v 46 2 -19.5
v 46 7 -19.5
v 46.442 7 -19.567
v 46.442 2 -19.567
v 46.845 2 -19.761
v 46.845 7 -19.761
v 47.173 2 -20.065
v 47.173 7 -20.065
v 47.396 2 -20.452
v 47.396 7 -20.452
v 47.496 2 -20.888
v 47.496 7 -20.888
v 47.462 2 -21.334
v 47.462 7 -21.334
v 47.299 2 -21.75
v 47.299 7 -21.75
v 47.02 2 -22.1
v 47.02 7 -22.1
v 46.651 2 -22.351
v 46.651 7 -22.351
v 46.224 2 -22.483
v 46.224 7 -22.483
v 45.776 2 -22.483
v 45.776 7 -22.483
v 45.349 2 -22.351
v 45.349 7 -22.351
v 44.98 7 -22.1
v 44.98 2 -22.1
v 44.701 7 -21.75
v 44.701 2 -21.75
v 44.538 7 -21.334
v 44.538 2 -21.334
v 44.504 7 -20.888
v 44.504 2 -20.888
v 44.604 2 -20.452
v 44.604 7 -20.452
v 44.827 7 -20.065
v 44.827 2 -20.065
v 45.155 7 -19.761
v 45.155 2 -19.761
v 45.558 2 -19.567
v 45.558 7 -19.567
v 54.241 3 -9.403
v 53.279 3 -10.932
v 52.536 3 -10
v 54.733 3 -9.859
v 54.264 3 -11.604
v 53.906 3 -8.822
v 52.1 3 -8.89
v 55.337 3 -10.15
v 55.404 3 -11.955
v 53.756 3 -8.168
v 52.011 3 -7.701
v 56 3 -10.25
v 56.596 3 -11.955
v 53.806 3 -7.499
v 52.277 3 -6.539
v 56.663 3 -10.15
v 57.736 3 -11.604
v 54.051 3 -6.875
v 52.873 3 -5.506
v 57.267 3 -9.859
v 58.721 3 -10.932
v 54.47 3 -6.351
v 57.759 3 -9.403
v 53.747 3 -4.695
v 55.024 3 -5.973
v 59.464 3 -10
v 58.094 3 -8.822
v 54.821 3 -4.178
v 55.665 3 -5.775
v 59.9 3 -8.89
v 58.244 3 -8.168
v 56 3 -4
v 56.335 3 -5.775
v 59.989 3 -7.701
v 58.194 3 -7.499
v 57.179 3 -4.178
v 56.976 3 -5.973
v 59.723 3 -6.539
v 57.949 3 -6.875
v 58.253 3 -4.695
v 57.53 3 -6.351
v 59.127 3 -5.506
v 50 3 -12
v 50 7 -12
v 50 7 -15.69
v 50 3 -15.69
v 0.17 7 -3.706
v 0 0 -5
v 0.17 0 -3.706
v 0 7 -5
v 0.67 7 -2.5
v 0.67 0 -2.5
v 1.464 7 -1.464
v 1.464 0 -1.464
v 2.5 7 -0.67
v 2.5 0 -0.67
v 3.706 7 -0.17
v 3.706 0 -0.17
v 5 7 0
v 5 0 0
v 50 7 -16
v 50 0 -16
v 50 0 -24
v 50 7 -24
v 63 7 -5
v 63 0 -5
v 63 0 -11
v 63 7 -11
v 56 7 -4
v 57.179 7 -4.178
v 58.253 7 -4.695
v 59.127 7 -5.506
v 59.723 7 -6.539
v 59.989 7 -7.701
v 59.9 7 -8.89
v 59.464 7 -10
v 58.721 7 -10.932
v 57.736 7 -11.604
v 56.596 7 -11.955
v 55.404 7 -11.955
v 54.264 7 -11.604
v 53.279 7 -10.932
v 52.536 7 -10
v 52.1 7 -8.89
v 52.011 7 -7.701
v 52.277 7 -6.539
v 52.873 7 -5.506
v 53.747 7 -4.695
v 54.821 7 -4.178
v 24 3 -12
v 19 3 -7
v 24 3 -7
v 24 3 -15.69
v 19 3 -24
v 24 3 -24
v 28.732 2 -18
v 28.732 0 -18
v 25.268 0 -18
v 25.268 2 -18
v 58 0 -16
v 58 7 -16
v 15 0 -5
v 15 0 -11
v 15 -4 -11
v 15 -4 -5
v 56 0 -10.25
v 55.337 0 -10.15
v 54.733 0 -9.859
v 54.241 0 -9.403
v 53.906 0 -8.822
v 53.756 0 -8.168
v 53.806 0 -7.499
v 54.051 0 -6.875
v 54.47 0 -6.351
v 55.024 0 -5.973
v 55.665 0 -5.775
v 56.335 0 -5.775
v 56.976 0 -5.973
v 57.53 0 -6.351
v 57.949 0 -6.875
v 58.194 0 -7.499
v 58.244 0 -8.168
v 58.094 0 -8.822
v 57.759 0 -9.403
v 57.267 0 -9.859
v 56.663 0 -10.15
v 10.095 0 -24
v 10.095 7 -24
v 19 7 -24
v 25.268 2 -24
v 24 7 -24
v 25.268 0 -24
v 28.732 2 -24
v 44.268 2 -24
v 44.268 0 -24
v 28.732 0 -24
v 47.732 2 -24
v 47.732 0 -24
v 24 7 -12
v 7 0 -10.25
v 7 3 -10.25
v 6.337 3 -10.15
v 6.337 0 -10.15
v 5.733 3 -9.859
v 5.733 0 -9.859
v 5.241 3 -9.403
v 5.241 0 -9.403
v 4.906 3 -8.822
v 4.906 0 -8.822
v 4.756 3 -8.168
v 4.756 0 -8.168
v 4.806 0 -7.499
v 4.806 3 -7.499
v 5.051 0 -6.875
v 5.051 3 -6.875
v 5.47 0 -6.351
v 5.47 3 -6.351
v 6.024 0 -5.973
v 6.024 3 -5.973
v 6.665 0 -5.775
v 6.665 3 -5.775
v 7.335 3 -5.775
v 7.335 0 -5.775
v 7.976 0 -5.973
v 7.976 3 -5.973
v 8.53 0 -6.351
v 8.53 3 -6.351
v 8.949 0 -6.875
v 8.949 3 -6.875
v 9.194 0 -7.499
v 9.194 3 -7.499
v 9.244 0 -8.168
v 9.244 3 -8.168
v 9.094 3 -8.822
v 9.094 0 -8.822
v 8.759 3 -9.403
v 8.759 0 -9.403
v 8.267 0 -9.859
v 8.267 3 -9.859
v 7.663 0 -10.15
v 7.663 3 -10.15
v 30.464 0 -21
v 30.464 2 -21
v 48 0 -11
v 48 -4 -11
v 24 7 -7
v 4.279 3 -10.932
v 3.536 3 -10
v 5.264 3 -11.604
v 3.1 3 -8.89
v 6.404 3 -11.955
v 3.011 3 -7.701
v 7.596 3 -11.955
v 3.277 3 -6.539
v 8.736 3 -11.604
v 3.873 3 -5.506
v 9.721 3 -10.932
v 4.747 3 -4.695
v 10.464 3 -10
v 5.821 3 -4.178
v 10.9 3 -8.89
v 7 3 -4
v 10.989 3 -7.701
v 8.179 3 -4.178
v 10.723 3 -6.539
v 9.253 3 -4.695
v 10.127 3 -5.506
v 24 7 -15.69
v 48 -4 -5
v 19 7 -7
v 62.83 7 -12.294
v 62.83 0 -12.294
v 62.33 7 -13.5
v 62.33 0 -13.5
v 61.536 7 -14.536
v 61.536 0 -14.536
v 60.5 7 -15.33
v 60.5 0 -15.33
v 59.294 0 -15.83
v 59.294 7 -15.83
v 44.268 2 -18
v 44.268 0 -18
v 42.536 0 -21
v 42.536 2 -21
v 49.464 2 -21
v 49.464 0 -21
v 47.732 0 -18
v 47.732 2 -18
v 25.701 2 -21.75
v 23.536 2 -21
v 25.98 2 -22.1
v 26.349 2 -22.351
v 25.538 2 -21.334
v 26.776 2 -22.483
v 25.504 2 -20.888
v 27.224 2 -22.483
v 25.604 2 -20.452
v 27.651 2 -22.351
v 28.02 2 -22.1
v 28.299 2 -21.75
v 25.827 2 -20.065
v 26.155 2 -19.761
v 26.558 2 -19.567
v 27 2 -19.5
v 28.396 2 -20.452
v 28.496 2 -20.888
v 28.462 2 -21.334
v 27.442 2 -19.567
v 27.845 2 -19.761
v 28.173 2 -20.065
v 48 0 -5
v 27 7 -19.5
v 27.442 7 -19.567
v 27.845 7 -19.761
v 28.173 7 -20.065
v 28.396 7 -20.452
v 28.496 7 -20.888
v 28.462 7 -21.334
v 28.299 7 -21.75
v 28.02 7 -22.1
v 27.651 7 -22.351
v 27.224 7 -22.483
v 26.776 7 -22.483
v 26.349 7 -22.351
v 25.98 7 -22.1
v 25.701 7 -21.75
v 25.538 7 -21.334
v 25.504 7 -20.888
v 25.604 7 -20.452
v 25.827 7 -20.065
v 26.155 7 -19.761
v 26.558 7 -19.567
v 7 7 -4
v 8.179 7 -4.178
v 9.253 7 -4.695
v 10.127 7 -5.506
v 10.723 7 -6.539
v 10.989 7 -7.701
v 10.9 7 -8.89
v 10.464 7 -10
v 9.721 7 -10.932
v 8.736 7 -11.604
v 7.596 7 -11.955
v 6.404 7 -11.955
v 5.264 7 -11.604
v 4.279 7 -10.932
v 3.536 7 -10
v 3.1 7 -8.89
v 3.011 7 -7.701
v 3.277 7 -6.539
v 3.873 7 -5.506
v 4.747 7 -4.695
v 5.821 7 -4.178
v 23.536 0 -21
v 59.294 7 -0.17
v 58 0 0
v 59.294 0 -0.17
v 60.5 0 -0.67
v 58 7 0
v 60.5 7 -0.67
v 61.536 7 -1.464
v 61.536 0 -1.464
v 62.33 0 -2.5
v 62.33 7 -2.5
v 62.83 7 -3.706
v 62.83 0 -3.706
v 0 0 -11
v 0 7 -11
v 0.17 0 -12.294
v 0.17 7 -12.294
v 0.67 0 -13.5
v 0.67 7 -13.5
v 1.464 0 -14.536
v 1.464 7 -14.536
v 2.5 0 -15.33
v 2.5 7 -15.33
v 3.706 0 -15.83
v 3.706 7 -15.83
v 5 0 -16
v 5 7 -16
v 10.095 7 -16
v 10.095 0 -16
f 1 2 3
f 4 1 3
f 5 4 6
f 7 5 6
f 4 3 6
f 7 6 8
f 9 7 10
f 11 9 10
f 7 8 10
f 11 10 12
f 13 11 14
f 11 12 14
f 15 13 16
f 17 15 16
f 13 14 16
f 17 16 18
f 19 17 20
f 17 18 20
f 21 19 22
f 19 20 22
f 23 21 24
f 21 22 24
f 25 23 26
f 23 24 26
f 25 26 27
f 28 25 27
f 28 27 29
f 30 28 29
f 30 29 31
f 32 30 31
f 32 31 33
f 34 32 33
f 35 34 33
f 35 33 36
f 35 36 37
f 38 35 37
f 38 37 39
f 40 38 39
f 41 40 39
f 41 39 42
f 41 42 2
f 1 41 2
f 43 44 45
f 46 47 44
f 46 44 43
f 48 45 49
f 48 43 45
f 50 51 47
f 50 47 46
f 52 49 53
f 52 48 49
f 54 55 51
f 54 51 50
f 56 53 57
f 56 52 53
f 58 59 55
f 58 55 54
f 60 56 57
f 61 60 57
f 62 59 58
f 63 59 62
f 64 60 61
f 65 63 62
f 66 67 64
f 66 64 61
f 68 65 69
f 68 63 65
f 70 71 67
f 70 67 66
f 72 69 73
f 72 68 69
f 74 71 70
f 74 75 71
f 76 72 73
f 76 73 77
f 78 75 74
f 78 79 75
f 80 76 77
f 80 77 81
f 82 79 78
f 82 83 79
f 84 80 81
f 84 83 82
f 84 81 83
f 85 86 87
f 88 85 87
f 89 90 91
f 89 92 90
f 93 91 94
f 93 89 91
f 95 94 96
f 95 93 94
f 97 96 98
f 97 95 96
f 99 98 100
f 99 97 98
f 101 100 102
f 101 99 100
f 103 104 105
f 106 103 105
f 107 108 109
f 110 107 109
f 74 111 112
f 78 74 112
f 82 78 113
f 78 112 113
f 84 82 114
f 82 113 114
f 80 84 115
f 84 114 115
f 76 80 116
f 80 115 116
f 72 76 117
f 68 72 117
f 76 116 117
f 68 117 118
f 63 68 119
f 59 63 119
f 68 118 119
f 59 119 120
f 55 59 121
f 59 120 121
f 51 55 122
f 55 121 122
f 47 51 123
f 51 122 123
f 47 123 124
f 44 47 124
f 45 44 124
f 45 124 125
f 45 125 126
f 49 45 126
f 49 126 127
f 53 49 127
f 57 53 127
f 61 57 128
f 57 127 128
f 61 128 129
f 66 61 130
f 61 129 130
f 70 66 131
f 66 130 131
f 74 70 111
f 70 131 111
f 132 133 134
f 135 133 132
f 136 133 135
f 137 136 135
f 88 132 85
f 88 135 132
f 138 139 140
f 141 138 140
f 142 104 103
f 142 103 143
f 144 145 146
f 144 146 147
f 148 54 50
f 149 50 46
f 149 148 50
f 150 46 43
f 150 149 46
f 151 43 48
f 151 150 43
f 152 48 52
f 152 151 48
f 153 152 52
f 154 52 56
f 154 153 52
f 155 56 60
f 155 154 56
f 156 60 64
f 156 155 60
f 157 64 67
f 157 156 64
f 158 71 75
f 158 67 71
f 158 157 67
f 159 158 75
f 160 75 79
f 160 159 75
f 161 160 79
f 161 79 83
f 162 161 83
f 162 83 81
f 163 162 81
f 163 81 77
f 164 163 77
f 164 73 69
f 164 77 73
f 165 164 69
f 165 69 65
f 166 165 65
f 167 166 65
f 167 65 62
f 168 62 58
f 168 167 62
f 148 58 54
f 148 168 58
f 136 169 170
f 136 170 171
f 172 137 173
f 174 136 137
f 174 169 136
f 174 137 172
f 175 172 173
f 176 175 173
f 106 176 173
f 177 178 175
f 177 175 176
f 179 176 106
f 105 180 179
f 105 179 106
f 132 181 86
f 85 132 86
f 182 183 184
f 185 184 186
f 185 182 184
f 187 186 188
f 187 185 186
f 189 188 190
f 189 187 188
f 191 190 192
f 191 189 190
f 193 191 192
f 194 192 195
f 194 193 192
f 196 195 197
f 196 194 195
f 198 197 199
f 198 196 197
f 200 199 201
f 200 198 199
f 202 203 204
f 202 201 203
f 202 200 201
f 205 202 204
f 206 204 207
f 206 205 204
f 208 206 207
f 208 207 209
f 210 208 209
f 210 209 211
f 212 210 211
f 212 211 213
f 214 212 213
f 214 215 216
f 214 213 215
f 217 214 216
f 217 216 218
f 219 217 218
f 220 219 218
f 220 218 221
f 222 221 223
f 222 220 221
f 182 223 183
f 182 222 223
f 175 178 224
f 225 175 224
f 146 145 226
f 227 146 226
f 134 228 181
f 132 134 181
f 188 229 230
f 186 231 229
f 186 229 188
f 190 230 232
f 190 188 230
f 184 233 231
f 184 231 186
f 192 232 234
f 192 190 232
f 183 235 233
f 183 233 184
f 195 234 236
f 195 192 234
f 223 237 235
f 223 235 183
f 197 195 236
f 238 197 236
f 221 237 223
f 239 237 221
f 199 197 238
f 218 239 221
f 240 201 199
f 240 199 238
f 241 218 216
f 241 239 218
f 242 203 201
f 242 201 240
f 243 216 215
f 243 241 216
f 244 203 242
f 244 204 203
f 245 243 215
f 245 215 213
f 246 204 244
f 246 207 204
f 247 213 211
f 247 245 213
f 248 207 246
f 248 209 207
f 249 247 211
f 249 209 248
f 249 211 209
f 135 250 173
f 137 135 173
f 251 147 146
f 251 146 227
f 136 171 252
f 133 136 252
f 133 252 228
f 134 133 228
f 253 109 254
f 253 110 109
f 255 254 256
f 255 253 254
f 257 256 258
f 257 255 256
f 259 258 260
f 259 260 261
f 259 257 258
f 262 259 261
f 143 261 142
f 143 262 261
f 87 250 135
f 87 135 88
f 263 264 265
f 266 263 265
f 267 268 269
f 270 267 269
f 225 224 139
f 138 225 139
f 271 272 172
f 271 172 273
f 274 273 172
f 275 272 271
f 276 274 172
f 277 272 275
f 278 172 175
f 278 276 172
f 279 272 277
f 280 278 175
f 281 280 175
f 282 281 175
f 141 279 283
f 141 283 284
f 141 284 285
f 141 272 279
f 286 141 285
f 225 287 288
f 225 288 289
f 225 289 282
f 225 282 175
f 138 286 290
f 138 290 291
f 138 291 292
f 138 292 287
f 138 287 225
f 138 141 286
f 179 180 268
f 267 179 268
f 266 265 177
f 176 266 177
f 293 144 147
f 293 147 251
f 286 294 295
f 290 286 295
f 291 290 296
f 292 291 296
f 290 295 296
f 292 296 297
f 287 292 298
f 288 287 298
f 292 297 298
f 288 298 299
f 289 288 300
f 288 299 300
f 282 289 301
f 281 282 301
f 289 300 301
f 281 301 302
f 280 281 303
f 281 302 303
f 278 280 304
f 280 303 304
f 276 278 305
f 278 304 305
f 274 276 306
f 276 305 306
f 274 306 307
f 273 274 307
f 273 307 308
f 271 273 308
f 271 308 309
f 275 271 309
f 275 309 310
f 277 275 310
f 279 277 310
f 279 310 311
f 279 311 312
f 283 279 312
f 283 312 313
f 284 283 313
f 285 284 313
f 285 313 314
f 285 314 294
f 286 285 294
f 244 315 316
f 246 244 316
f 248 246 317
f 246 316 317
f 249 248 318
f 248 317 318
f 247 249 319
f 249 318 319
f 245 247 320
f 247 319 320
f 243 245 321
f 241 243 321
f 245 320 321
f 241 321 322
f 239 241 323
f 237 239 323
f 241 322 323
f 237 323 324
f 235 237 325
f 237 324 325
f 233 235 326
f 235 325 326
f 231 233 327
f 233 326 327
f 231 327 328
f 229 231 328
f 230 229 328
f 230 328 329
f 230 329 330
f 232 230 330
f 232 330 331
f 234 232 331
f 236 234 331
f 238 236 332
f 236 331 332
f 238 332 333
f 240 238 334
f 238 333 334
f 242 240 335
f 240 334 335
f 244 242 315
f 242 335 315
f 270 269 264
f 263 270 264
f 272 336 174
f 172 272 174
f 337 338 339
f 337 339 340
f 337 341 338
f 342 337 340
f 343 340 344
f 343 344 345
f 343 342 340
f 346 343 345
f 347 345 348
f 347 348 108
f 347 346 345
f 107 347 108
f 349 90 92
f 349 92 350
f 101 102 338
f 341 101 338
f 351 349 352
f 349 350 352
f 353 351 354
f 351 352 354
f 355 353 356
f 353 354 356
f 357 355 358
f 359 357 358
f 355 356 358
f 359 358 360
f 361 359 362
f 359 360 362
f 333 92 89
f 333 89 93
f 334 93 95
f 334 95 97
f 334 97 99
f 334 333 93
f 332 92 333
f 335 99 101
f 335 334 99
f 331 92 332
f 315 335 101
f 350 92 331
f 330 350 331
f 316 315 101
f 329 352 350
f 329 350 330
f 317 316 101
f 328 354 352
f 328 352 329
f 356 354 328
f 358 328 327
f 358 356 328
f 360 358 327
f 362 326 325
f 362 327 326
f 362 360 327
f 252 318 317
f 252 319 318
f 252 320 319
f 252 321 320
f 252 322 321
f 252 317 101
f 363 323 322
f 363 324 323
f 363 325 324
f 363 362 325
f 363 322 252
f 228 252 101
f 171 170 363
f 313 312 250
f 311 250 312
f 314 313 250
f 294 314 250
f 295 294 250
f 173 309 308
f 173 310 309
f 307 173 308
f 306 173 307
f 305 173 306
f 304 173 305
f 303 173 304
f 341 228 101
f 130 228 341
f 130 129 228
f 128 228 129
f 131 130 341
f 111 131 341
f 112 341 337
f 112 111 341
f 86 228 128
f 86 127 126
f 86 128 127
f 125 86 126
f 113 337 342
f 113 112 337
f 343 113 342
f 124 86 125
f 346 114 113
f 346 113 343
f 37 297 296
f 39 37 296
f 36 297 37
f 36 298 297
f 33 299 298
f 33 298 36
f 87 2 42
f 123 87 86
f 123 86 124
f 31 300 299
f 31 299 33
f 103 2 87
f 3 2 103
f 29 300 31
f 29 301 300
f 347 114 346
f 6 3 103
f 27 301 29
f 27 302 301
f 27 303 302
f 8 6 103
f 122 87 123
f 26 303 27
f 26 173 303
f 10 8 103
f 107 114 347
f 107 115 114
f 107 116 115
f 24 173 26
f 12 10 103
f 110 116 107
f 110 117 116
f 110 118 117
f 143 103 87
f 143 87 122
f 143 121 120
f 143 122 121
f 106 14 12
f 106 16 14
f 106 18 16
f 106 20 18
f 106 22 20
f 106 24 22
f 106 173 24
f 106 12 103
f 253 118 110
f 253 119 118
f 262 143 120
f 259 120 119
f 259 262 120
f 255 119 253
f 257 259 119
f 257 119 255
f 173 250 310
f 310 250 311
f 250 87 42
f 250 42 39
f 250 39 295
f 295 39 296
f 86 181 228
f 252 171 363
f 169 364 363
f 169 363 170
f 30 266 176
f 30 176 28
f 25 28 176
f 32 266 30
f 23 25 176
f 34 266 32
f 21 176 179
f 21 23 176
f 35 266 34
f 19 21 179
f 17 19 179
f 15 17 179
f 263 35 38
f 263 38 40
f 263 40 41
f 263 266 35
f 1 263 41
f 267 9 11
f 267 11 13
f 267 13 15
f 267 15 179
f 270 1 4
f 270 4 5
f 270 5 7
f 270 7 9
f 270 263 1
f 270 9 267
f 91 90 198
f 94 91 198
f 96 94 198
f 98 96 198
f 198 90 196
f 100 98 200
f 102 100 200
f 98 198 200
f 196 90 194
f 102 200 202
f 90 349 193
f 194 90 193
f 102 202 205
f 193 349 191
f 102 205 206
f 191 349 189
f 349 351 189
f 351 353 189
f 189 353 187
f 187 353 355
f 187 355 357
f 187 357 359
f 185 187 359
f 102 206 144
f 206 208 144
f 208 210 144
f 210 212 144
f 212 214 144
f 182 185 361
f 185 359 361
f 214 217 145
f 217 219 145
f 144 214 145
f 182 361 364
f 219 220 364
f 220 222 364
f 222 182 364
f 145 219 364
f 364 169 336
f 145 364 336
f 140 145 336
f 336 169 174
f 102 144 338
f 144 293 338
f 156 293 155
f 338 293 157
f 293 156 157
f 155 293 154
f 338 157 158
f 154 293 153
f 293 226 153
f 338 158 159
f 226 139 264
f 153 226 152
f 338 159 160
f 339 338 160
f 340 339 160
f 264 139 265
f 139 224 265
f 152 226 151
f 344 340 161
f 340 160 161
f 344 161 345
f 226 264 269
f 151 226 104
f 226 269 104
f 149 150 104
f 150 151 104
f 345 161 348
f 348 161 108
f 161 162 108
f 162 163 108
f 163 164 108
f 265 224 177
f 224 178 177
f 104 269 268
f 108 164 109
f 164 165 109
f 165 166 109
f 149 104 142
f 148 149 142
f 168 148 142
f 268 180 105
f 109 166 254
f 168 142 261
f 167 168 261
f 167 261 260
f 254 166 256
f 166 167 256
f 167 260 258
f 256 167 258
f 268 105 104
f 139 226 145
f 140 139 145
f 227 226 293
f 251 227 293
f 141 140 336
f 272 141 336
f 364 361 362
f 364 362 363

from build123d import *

# Parameters (mm, degrees)
EXTRUDE_1_DEPTH     = 7
SKETCH_2_R          = 2.25
CUT_EXTRUDE_1_DEPTH = 47
SKETCH_3_W          = 33
SKETCH_3_H          = 6
EXTRUDE_2_DEPTH     = 4
CUT_EXTRUDE_2_DEPTH = 4
SKETCH_5_3_R        = 1.5
CUT_EXTRUDE_3_DEPTH = 20
CUT_EXTRUDE_4_DEPTH = 2
FILLET_1_R          = 5
SKETCH_7_R          = 4
CUT_EXTRUDE_5_DEPTH = 4


with BuildPart() as part:
    # Эскиз1 → Бобышка-Вытянуть1 (new body)
    with BuildSketch(Plane(origin=(0, 0, 0), x_dir=(1, 0, 0), z_dir=(0, 1, 0))):
        Polygon((0, 16), (0, 0), (63, 0), (63, 16), (50, 16), (50, 24), (10.095388493, 24), (10.095388493, 16), align=None)
    extrude(amount=EXTRUDE_1_DEPTH)

    # Эскиз2 → Вырез-Вытянуть1 (cut)
    with BuildSketch(Plane(origin=(0, 0, 0), x_dir=(1, 0, 0), z_dir=(0, 1, 0))):
        with Locations((7, 8)):
            Circle(SKETCH_2_R)
        with Locations((56, 8)):
            Circle(SKETCH_2_R)
    extrude(amount=CUT_EXTRUDE_1_DEPTH, mode=Mode.SUBTRACT)

    # Эскиз3 → Бобышка-Вытянуть2 (add)
    with BuildSketch(Plane.XZ):
        with Locations((31.5, -8)):
            Rectangle(SKETCH_3_W, SKETCH_3_H)
    extrude(amount=EXTRUDE_2_DEPTH)

    # Эскиз5 → Вырез-Вытянуть2 (cut)
    with BuildSketch(Plane(origin=(0, 7, 0), x_dir=(1, 0, 0), z_dir=(0, 1, 0))):
        Polygon((50, 12), (50, 15.69), (24, 15.69), (24, 24), (19, 24), (19, 7), (24, 7), (24, 12), align=None)
    extrude(amount=-CUT_EXTRUDE_2_DEPTH, mode=Mode.SUBTRACT)

    # Эскиз5<3> → Вырез-Вытянуть3 (cut)
    with BuildSketch(Plane(origin=(0, 7, 0), x_dir=(1, 0, 0), z_dir=(0, 1, 0))):
        with Locations((46, 21)):
            Circle(SKETCH_5_3_R)
        with Locations((27, 21)):
            Circle(SKETCH_5_3_R)
    extrude(amount=-CUT_EXTRUDE_3_DEPTH, mode=Mode.SUBTRACT)

    # Эскиз6 → Вырез-Вытянуть4 (cut)
    with BuildSketch(Plane.XZ):
        Polygon((47.732050808, -18), (44.267949192, -18), (42.535898385, -21), (44.267949192, -24), (47.732050808, -24), (49.464101615, -21), align=None)
        Polygon((30.464101615, -21), (28.732050808, -18), (25.267949192, -18), (23.535898385, -21), (25.267949192, -24), (28.732050808, -24), align=None)
    extrude(amount=-CUT_EXTRUDE_4_DEPTH, mode=Mode.SUBTRACT)

    # Скругление1
    fillet_1_edges = [part.edges().sort_by_distance(p)[0] for p in [
        (0, 3.5, -16),
        (0, 3.5, 0),
        (63, 3.5, 0),
        (63, 3.5, -16),
    ]]
    fillet(fillet_1_edges, radius=FILLET_1_R)

    # Эскиз7 → Вырез-Вытянуть5 (cut)
    with BuildSketch(Plane(origin=(0, 7, 0), x_dir=(1, 0, 0), z_dir=(0, 1, 0))):
        with Locations((7, 8)):
            Circle(SKETCH_7_R)
        with Locations((56, 8)):
            Circle(SKETCH_7_R)
    extrude(amount=-CUT_EXTRUDE_5_DEPTH, mode=Mode.SUBTRACT)


solid = part.part
